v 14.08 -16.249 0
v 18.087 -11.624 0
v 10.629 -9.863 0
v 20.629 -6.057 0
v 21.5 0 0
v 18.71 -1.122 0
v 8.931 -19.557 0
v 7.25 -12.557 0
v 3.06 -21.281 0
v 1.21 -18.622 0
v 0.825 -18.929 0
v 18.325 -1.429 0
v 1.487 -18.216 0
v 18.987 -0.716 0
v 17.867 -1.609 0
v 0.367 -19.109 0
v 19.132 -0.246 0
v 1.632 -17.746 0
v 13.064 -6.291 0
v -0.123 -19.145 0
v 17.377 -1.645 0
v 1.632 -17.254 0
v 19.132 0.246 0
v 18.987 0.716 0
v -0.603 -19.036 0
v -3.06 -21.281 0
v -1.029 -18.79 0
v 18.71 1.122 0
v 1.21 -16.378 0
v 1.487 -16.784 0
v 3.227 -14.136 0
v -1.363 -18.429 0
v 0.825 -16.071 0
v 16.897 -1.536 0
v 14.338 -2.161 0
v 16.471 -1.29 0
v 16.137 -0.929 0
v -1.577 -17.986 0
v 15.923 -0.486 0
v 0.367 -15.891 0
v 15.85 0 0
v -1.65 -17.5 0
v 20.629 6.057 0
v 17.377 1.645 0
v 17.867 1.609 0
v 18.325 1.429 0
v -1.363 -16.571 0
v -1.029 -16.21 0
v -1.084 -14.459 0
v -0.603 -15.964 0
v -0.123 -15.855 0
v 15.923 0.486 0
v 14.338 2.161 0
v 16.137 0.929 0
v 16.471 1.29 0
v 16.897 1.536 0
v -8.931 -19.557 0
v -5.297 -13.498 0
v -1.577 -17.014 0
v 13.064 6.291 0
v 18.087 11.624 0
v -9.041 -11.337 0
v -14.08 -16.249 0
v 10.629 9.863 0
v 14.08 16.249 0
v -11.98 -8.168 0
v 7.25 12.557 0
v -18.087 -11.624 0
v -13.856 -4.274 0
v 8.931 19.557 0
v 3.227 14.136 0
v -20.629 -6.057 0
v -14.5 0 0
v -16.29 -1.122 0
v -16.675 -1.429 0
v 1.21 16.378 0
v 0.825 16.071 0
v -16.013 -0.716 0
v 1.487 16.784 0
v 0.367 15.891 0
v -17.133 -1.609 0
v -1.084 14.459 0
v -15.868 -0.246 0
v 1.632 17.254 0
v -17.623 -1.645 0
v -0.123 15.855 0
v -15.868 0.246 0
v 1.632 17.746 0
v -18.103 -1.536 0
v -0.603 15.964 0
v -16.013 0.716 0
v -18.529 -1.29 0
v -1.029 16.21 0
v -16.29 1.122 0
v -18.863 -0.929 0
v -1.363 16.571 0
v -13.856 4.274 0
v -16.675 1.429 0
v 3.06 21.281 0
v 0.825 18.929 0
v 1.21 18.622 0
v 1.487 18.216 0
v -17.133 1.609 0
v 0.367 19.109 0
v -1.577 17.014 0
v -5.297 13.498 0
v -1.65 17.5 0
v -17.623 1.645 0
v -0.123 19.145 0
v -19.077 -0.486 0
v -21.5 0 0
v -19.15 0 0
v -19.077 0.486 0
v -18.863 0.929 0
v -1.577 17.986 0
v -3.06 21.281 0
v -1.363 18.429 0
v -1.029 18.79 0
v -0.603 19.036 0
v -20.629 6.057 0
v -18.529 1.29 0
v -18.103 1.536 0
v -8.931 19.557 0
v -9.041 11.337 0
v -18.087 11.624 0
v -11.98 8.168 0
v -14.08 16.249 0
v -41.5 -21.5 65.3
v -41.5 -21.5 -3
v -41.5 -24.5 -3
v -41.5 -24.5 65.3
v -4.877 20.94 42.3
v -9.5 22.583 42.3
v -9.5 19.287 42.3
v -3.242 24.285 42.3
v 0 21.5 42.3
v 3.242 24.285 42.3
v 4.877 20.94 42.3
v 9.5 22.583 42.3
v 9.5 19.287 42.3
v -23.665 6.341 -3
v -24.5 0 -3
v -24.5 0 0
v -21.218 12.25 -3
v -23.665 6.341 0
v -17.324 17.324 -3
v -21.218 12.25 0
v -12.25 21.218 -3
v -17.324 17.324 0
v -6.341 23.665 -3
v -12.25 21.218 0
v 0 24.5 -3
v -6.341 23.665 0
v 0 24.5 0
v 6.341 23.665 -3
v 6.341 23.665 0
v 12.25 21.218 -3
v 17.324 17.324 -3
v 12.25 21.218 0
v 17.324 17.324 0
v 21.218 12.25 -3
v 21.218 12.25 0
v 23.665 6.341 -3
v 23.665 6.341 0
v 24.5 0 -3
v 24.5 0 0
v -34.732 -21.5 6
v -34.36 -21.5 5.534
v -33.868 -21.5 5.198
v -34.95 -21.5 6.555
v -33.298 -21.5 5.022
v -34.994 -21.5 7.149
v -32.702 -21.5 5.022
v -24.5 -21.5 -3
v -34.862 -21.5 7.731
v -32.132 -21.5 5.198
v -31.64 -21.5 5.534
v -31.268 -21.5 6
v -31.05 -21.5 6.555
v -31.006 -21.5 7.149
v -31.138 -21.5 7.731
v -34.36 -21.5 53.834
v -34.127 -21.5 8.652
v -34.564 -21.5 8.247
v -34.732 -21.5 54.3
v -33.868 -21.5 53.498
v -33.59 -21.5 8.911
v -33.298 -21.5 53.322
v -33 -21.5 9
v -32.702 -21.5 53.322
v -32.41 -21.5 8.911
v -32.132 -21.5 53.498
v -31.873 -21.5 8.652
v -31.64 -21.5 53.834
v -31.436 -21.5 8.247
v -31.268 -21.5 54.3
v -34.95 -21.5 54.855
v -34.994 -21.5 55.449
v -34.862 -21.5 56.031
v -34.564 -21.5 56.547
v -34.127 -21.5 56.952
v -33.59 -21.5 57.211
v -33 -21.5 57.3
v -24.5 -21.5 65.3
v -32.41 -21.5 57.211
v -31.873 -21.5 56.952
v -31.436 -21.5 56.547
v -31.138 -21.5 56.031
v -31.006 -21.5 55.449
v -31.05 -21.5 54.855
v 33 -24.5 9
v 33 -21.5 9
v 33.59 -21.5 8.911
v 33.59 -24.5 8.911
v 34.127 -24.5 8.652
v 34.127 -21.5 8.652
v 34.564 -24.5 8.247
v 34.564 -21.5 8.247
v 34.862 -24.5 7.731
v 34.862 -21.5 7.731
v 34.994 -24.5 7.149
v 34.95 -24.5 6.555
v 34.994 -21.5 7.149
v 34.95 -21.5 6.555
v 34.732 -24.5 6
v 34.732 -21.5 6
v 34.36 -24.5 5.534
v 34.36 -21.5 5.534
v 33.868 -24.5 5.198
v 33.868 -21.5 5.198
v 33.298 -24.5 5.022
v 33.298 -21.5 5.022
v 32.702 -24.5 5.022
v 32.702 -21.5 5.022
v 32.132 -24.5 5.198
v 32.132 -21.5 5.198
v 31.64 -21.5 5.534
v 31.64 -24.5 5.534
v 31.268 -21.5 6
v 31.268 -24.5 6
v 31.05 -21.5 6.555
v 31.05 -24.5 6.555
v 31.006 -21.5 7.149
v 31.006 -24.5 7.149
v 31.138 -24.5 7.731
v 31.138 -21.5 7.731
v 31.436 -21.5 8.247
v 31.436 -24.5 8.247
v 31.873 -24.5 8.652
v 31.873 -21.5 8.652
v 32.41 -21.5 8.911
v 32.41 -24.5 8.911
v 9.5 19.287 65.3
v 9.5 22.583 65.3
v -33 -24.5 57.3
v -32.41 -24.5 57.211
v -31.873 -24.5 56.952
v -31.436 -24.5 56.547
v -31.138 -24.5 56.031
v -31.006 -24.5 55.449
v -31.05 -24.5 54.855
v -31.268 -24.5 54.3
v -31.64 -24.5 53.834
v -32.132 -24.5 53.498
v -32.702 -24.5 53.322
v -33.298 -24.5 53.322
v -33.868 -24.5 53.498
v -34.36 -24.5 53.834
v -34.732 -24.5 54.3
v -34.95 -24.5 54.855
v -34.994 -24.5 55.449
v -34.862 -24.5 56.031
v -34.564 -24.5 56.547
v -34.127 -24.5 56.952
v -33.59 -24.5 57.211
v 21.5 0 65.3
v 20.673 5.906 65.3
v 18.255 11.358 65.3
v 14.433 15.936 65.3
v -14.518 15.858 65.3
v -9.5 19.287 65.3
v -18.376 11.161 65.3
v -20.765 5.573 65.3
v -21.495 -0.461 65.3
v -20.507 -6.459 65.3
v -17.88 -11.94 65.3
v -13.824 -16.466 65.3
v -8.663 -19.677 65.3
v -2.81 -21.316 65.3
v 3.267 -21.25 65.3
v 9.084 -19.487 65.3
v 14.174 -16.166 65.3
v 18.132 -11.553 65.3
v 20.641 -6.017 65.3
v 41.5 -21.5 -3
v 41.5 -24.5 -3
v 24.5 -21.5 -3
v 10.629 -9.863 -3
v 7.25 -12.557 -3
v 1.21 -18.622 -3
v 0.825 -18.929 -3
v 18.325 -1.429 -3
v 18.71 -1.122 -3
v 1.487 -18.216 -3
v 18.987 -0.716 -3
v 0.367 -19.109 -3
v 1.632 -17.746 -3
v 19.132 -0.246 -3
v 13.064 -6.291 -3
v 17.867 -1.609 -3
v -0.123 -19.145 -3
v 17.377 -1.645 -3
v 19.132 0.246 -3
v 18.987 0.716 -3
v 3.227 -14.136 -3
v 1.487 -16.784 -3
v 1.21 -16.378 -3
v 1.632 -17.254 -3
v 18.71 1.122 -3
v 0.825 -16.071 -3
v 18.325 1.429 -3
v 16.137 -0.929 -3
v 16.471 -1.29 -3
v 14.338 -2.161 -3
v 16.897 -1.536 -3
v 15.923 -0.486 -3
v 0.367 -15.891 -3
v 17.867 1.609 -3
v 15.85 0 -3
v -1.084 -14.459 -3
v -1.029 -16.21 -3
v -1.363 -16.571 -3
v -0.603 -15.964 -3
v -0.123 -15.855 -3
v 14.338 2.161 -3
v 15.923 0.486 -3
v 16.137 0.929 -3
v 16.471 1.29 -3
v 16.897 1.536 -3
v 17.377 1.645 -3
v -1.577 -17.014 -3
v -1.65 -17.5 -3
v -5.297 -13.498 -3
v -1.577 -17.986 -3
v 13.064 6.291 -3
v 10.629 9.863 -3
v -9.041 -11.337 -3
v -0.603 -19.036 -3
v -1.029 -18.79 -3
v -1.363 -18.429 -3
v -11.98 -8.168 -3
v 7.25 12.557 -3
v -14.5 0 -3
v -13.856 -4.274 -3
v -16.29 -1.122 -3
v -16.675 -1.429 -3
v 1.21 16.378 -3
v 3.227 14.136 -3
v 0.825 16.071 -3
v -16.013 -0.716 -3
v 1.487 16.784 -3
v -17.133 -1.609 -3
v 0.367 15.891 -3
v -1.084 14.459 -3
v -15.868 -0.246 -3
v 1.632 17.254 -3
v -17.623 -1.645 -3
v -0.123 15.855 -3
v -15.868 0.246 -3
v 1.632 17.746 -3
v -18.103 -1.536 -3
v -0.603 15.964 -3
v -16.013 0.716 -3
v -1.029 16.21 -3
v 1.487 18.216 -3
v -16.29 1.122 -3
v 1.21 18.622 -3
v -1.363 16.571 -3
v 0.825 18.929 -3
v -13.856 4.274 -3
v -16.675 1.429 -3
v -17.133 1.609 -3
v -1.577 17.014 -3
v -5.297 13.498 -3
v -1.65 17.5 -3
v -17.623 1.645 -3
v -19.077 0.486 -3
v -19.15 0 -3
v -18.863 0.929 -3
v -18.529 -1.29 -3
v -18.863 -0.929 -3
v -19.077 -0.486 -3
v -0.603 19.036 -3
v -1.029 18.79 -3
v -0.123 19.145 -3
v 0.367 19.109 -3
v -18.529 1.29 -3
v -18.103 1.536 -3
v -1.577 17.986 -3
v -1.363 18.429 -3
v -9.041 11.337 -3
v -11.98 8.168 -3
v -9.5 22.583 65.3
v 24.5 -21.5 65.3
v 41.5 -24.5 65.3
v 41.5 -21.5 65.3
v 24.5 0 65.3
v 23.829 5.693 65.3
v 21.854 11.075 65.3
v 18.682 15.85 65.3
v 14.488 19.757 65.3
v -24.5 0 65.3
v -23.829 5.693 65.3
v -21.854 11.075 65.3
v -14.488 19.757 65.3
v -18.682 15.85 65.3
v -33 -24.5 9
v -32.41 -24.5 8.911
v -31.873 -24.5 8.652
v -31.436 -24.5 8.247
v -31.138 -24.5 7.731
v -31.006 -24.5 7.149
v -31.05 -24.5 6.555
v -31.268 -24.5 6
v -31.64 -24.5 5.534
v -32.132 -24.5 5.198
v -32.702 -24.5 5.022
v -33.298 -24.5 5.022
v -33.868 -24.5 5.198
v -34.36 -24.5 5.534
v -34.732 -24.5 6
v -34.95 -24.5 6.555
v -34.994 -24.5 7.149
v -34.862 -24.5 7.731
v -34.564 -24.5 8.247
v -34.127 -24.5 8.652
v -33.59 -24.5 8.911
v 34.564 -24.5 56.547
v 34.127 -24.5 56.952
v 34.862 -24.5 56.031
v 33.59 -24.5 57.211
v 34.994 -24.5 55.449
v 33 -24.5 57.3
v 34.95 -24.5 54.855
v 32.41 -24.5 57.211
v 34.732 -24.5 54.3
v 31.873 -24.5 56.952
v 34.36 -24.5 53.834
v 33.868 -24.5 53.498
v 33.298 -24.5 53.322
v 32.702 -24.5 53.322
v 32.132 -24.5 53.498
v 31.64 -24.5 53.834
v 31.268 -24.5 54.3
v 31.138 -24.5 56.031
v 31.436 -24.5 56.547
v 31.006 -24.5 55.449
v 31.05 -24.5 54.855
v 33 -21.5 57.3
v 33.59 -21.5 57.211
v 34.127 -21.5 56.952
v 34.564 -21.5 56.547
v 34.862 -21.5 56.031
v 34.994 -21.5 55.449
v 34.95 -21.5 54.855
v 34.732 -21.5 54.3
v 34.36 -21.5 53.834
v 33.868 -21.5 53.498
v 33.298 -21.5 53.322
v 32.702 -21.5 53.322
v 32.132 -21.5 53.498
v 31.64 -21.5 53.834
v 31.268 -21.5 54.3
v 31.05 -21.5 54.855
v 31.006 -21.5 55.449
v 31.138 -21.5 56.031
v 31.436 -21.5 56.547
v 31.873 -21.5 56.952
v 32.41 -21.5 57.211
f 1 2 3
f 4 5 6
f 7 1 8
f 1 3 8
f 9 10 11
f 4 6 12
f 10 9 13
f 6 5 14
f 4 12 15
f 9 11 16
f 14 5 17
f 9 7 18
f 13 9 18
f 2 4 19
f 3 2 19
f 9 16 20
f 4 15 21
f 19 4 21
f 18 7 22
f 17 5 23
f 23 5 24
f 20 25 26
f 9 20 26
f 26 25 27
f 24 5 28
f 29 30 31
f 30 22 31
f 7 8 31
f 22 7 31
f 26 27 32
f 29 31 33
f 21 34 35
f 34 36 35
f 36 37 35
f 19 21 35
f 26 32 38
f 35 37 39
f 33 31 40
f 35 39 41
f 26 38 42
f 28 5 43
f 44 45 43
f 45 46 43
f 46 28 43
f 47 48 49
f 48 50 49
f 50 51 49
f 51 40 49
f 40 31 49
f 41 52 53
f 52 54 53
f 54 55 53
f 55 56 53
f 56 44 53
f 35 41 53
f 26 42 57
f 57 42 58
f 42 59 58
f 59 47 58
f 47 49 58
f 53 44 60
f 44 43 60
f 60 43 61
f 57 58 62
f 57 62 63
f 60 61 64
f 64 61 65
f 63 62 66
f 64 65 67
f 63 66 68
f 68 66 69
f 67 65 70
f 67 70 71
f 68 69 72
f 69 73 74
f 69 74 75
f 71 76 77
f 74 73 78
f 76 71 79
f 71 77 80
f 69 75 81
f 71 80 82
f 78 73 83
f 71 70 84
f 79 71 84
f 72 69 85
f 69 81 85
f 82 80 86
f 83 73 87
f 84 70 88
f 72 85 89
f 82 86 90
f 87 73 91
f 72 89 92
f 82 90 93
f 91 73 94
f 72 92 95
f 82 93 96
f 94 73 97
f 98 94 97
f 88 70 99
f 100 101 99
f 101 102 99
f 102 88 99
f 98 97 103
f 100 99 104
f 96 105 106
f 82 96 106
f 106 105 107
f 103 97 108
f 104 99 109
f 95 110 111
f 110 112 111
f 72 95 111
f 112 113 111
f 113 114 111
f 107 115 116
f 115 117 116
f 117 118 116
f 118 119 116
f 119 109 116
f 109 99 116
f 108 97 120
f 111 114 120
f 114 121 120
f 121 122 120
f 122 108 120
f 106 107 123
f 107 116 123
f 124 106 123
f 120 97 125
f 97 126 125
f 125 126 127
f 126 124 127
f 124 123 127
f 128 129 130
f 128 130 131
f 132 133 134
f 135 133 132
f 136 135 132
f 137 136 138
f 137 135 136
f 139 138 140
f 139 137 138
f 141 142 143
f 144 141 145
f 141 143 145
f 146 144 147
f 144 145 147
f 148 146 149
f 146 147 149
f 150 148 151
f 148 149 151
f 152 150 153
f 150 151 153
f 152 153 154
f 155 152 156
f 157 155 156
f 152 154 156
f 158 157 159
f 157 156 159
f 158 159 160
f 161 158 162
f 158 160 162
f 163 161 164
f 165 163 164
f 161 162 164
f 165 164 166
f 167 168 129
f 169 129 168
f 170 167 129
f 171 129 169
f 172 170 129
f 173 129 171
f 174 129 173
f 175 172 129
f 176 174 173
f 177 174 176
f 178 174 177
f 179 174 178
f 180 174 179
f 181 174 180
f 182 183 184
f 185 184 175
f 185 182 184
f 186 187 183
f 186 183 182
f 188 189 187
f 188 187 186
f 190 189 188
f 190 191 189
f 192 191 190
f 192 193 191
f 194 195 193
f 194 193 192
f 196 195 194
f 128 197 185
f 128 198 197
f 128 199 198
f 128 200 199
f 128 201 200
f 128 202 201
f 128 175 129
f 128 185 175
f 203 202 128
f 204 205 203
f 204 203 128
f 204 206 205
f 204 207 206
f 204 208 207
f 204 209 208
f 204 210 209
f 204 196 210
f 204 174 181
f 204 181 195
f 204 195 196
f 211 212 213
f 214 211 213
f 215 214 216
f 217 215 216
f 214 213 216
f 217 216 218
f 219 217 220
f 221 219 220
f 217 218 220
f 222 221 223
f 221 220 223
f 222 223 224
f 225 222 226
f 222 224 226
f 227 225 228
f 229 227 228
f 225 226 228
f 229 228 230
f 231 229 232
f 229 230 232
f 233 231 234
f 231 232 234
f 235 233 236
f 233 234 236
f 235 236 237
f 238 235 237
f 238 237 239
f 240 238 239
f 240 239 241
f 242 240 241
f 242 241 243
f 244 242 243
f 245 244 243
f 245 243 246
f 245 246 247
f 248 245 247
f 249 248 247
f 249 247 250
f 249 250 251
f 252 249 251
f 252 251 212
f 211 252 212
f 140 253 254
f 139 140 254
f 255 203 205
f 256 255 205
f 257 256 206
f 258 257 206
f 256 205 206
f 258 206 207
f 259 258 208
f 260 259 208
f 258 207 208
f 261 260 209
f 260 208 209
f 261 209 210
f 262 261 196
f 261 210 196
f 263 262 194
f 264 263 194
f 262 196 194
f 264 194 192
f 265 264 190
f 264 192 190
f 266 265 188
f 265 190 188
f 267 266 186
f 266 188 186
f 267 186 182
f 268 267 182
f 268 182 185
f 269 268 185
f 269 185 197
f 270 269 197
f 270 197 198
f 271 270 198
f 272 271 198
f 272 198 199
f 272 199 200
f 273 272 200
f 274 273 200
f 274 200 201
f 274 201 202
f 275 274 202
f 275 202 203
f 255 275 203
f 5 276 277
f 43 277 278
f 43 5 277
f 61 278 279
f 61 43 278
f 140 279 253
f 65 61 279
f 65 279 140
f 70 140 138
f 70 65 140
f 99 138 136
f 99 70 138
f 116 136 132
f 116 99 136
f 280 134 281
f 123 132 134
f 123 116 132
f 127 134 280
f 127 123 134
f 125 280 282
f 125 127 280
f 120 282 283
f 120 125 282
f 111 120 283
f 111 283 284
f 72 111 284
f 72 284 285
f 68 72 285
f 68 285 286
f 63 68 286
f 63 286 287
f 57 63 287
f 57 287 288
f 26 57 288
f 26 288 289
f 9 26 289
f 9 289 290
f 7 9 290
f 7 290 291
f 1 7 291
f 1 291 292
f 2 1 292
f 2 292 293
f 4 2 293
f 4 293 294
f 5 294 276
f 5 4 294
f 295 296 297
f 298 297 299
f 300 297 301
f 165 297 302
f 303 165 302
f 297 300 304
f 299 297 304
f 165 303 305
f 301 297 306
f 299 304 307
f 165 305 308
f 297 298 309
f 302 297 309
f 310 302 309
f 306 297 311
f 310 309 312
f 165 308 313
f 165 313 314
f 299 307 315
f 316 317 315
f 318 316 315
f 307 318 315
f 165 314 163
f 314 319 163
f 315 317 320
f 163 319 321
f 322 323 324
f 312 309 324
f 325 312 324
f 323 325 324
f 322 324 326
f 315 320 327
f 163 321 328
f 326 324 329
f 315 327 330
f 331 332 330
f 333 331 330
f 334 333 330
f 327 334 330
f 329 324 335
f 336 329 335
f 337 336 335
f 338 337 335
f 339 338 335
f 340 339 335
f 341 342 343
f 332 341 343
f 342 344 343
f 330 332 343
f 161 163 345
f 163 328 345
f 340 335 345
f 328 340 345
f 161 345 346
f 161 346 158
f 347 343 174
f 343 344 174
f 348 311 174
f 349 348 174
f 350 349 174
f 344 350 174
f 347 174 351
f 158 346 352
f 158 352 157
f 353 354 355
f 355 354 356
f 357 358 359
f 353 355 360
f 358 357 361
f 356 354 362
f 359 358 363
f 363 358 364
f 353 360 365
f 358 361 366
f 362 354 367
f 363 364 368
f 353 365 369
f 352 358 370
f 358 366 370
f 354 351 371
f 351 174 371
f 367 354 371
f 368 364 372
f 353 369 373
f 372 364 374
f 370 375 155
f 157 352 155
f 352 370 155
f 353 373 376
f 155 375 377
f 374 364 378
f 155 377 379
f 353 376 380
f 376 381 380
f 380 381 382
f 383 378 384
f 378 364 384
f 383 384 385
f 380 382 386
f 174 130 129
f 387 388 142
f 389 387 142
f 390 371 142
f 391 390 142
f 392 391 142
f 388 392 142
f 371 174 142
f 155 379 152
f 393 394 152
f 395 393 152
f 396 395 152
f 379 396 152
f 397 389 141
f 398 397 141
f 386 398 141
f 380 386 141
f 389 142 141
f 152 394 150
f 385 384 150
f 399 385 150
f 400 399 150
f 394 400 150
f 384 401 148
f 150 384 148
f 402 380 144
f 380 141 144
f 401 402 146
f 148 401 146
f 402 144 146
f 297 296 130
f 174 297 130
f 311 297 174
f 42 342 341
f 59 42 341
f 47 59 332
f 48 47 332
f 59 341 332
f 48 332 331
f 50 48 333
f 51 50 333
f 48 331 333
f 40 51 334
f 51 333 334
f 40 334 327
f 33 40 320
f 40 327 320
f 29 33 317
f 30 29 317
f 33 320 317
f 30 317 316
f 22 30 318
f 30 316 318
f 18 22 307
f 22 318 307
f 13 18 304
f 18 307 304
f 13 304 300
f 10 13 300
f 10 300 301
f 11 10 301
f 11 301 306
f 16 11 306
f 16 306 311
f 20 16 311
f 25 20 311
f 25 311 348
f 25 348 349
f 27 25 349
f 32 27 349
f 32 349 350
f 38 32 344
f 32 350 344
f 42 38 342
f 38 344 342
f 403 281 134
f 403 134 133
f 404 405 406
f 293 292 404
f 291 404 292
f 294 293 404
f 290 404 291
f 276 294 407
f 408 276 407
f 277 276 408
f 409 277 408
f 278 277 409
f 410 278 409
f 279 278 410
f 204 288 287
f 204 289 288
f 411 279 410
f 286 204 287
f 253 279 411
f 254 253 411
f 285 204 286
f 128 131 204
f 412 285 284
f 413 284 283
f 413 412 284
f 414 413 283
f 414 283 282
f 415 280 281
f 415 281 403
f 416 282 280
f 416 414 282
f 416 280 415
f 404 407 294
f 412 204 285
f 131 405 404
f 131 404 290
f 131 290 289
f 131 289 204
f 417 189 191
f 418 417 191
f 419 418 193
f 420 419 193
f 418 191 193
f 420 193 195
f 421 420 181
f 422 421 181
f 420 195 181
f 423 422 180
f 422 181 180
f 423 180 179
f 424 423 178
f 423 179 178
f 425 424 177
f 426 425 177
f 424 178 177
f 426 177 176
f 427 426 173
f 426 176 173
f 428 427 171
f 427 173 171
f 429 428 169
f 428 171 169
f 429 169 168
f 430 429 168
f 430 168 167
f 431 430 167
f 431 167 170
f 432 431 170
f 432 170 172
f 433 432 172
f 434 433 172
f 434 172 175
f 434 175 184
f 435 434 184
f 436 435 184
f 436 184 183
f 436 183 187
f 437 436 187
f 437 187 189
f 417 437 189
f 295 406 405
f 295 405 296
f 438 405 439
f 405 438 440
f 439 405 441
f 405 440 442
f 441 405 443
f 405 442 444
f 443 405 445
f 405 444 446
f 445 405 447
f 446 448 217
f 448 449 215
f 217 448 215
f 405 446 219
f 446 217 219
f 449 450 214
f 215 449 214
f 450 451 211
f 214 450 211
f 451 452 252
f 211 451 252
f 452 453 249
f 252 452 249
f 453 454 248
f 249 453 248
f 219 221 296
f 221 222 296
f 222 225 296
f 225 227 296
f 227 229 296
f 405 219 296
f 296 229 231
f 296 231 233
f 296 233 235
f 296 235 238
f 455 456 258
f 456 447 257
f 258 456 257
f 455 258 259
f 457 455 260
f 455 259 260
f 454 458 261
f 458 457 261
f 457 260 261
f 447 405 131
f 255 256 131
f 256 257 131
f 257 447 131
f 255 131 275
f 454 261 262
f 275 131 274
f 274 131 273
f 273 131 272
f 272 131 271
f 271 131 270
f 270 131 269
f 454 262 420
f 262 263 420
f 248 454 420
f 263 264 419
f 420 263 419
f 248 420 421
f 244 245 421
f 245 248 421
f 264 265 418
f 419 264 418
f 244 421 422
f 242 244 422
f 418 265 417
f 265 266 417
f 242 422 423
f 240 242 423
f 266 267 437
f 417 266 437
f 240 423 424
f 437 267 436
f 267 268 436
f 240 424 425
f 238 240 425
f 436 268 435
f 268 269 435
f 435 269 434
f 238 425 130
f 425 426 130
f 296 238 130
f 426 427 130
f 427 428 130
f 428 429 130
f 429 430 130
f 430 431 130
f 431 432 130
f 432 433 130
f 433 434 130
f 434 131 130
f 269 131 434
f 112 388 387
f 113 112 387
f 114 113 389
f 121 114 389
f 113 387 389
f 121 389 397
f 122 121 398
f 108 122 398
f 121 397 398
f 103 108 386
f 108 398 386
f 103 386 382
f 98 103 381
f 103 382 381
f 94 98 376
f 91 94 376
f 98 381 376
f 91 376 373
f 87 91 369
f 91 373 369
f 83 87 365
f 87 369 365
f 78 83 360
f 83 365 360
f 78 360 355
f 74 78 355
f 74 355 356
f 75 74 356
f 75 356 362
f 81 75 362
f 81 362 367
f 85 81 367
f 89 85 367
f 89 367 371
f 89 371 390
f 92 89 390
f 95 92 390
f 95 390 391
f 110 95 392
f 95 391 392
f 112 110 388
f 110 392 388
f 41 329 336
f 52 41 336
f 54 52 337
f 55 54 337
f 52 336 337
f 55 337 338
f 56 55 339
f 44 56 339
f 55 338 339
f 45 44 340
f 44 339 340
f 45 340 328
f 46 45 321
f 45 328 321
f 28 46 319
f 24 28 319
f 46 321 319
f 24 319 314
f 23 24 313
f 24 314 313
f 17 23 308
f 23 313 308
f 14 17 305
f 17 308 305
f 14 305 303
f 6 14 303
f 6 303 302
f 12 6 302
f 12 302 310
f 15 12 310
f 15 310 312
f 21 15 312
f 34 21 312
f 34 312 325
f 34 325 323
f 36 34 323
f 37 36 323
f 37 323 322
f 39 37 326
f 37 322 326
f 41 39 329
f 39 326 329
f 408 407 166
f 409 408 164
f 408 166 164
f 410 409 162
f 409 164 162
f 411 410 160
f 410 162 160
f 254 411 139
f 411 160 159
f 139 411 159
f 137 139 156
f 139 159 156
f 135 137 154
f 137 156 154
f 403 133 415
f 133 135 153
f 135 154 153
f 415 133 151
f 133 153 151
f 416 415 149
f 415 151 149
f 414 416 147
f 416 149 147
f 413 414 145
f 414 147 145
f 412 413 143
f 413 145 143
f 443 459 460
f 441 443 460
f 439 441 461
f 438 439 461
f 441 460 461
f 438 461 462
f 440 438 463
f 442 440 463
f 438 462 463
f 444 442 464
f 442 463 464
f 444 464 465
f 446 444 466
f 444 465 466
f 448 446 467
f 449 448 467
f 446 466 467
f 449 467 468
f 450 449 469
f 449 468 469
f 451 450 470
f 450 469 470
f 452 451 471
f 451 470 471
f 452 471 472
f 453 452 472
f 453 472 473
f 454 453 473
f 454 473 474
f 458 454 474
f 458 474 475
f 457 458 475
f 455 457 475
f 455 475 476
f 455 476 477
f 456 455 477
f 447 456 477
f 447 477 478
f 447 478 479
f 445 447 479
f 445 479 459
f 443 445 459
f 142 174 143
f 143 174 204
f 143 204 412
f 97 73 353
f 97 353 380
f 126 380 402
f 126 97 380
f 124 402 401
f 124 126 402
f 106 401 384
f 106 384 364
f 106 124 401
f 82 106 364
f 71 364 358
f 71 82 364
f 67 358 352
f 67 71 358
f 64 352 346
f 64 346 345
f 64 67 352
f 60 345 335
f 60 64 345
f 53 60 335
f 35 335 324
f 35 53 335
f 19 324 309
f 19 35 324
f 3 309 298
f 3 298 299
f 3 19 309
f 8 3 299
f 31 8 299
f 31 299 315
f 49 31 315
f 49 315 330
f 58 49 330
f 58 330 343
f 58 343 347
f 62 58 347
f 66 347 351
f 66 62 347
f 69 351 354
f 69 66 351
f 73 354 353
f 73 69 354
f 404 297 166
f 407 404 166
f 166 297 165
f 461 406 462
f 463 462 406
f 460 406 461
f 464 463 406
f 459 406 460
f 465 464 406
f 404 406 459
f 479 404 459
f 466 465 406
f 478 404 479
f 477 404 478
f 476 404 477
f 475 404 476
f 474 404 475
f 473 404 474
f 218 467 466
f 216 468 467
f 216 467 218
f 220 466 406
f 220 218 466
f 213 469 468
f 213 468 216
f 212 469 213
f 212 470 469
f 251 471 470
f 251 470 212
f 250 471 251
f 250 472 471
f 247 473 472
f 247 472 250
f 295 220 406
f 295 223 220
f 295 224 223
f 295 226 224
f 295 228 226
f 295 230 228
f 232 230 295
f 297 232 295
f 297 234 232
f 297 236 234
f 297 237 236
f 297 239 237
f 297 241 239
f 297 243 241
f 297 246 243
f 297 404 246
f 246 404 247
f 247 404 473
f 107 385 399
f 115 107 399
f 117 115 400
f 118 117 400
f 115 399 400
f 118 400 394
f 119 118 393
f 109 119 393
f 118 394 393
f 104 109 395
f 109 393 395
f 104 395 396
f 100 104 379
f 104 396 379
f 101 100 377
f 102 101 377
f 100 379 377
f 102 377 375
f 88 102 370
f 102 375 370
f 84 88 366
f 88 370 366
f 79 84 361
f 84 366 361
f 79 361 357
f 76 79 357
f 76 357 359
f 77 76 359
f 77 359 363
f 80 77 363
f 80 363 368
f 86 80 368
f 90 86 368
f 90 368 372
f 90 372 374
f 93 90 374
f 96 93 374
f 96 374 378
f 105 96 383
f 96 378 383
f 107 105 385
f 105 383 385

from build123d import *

# Parameters (mm, degrees)
ESQUISSE1_R             = 24.5
ESQUISSE1_R_2           = 21.5
BOSS_EXTRU_1_DEPTH      = 65.3
ESQUISSE2_R             = 21.5
ESQUISSE2_R_2           = 14.5
BOSS_EXTRU_2_DEPTH      = 3
ESQUISSE3_R             = 1.65
ENL_V_MAT_EXTRU_1_DEPTH = 3
ESQUISSE4_W             = 19
ESQUISSE4_H             = 5.738367338
ENL_V_MAT_EXTRU_2_DEPTH = 23
ESQUISSE5_W             = 68.3
ESQUISSE5_H             = 3
BOSS_EXTRU_3_DEPTH      = 17
ESQUISSE6_W             = 68.3
ESQUISSE6_H             = 3
BOSS_EXTRU_4_DEPTH      = 17
ESQUISSE7_R             = 2
ENL_V_MAT_EXTRU_3_DEPTH = 10
ESQUISSE9_R             = 2
ENL_V_MAT_EXTRU_4_DEPTH = 10


with BuildPart() as part:
    # Esquisse1 → Boss.-Extru.1 (new body)
    with BuildSketch(Plane.XY):
        Circle(ESQUISSE1_R)
        Circle(ESQUISSE1_R_2, mode=Mode.SUBTRACT)
        with BuildLine():
            Line((-24.5, 0), (-24.5, -24.5))
            Line((-24.5, -24.5), (-6e-09, -24.5))
            ThreePointArc((-6e-09, -24.5), (-17.324116141, -17.324116137), (-24.5, 0))
        make_face()
        with BuildLine():
            ThreePointArc((24.5, 0), (17.324116137, -17.324116141), (-6e-09, -24.5))
            Line((-6e-09, -24.5), (24.5, -24.5))
            Line((24.5, -24.5), (24.5, 0))
        make_face()
    extrude(amount=BOSS_EXTRU_1_DEPTH)

    # Esquisse2 → Boss.-Extru.2 (add)
    with BuildSketch(Plane(origin=(0, 0, 0), x_dir=(-1, 0, 0), z_dir=(0, 0, -1))):
        with BuildLine():
            ThreePointArc((24.5, 0), (0, 24.5), (-24.5, 0))
            ThreePointArc((-24.5, 0), (-17.324116141, -17.324116137), (-6e-09, -24.5))
            ThreePointArc((-6e-09, -24.5), (17.324116137, -17.324116141), (24.5, 0))
        make_face()
        with Locations(Location((0, 0, 0), (0, 0, 180))):
            Circle(ESQUISSE2_R, mode=Mode.SUBTRACT)
        with Locations(Location((0, 0, 0), (0, 0, 180))):
            Circle(ESQUISSE2_R)
        Circle(ESQUISSE2_R_2, mode=Mode.SUBTRACT)
        with BuildLine():
            ThreePointArc((-6e-09, -24.5), (-17.324116141, -17.324116137), (-24.5, 0))
            Line((-24.5, 0), (-24.5, -24.5))
            Line((-24.5, -24.5), (-6e-09, -24.5))
        make_face()
        with BuildLine():
            Line((24.5, -24.5), (24.5, 0))
            ThreePointArc((24.5, 0), (17.324116137, -17.324116141), (-6e-09, -24.5))
            Line((-6e-09, -24.5), (24.5, -24.5))
        make_face()
    extrude(amount=BOSS_EXTRU_2_DEPTH)

    # Esquisse3 → Enlèv. mat.-Extru.1 (cut)
    with BuildSketch(Plane(origin=(0, 0, -3), x_dir=(-1, 0, 0), z_dir=(0, 0, -1))):
        with Locations((-17.5, 0)):
            Circle(ESQUISSE3_R)
        with Locations((17.5, 0)):
            Circle(ESQUISSE3_R)
        with Locations((0, 17.5)):
            Circle(ESQUISSE3_R)
        with Locations((0, -17.5)):
            Circle(ESQUISSE3_R)
    extrude(amount=-ENL_V_MAT_EXTRU_1_DEPTH, mode=Mode.SUBTRACT)

    # Esquisse4 → Enlèv. mat.-Extru.2 (cut)
    with BuildSketch(Plane.XY.offset(65.3)):
        with Locations((0, 22.156485191)):
            Rectangle(ESQUISSE4_W, ESQUISSE4_H)
    extrude(amount=-ENL_V_MAT_EXTRU_2_DEPTH, mode=Mode.SUBTRACT)

    # Esquisse5 → Boss.-Extru.3 (add)
    with BuildSketch(Plane.ZY.offset(24.5)):
        with Locations((31.15, -23)):
            Rectangle(ESQUISSE5_W, ESQUISSE5_H)
    extrude(amount=BOSS_EXTRU_3_DEPTH)

    # Esquisse6 → Boss.-Extru.4 (add)
    with BuildSketch(Plane(origin=(24.5, 0, 0), x_dir=(0, 0, -1), z_dir=(1, 0, 0))):
        with Locations((-31.15, -23)):
            Rectangle(ESQUISSE6_W, ESQUISSE6_H)
    extrude(amount=BOSS_EXTRU_4_DEPTH)

    # Esquisse7 → Enlèv. mat.-Extru.3 (cut)
    with BuildSketch(Plane(origin=(0, -21.5, 0), x_dir=(1, 0, 0), z_dir=(0, 1, 0))):
        with Locations(Location((-33, -7, 0), (0, 0, 270))):
            Circle(ESQUISSE7_R)
        with Locations(Location((-33, -55.3, 0), (0, 0, 270))):
            Circle(ESQUISSE7_R)
    extrude(amount=-ENL_V_MAT_EXTRU_3_DEPTH, mode=Mode.SUBTRACT)

    # Esquisse9 → Enlèv. mat.-Extru.4 (cut)
    with BuildSketch(Plane(origin=(0, -21.5, 0), x_dir=(1, 0, 0), z_dir=(0, 1, 0))):
        with Locations(Location((33, -7, 0), (0, 0, 270))):
            Circle(ESQUISSE9_R)
        with Locations(Location((33, -55.3, 0), (0, 0, 270))):
            Circle(ESQUISSE9_R)
    extrude(amount=-ENL_V_MAT_EXTRU_4_DEPTH, mode=Mode.SUBTRACT)


solid = part.part
